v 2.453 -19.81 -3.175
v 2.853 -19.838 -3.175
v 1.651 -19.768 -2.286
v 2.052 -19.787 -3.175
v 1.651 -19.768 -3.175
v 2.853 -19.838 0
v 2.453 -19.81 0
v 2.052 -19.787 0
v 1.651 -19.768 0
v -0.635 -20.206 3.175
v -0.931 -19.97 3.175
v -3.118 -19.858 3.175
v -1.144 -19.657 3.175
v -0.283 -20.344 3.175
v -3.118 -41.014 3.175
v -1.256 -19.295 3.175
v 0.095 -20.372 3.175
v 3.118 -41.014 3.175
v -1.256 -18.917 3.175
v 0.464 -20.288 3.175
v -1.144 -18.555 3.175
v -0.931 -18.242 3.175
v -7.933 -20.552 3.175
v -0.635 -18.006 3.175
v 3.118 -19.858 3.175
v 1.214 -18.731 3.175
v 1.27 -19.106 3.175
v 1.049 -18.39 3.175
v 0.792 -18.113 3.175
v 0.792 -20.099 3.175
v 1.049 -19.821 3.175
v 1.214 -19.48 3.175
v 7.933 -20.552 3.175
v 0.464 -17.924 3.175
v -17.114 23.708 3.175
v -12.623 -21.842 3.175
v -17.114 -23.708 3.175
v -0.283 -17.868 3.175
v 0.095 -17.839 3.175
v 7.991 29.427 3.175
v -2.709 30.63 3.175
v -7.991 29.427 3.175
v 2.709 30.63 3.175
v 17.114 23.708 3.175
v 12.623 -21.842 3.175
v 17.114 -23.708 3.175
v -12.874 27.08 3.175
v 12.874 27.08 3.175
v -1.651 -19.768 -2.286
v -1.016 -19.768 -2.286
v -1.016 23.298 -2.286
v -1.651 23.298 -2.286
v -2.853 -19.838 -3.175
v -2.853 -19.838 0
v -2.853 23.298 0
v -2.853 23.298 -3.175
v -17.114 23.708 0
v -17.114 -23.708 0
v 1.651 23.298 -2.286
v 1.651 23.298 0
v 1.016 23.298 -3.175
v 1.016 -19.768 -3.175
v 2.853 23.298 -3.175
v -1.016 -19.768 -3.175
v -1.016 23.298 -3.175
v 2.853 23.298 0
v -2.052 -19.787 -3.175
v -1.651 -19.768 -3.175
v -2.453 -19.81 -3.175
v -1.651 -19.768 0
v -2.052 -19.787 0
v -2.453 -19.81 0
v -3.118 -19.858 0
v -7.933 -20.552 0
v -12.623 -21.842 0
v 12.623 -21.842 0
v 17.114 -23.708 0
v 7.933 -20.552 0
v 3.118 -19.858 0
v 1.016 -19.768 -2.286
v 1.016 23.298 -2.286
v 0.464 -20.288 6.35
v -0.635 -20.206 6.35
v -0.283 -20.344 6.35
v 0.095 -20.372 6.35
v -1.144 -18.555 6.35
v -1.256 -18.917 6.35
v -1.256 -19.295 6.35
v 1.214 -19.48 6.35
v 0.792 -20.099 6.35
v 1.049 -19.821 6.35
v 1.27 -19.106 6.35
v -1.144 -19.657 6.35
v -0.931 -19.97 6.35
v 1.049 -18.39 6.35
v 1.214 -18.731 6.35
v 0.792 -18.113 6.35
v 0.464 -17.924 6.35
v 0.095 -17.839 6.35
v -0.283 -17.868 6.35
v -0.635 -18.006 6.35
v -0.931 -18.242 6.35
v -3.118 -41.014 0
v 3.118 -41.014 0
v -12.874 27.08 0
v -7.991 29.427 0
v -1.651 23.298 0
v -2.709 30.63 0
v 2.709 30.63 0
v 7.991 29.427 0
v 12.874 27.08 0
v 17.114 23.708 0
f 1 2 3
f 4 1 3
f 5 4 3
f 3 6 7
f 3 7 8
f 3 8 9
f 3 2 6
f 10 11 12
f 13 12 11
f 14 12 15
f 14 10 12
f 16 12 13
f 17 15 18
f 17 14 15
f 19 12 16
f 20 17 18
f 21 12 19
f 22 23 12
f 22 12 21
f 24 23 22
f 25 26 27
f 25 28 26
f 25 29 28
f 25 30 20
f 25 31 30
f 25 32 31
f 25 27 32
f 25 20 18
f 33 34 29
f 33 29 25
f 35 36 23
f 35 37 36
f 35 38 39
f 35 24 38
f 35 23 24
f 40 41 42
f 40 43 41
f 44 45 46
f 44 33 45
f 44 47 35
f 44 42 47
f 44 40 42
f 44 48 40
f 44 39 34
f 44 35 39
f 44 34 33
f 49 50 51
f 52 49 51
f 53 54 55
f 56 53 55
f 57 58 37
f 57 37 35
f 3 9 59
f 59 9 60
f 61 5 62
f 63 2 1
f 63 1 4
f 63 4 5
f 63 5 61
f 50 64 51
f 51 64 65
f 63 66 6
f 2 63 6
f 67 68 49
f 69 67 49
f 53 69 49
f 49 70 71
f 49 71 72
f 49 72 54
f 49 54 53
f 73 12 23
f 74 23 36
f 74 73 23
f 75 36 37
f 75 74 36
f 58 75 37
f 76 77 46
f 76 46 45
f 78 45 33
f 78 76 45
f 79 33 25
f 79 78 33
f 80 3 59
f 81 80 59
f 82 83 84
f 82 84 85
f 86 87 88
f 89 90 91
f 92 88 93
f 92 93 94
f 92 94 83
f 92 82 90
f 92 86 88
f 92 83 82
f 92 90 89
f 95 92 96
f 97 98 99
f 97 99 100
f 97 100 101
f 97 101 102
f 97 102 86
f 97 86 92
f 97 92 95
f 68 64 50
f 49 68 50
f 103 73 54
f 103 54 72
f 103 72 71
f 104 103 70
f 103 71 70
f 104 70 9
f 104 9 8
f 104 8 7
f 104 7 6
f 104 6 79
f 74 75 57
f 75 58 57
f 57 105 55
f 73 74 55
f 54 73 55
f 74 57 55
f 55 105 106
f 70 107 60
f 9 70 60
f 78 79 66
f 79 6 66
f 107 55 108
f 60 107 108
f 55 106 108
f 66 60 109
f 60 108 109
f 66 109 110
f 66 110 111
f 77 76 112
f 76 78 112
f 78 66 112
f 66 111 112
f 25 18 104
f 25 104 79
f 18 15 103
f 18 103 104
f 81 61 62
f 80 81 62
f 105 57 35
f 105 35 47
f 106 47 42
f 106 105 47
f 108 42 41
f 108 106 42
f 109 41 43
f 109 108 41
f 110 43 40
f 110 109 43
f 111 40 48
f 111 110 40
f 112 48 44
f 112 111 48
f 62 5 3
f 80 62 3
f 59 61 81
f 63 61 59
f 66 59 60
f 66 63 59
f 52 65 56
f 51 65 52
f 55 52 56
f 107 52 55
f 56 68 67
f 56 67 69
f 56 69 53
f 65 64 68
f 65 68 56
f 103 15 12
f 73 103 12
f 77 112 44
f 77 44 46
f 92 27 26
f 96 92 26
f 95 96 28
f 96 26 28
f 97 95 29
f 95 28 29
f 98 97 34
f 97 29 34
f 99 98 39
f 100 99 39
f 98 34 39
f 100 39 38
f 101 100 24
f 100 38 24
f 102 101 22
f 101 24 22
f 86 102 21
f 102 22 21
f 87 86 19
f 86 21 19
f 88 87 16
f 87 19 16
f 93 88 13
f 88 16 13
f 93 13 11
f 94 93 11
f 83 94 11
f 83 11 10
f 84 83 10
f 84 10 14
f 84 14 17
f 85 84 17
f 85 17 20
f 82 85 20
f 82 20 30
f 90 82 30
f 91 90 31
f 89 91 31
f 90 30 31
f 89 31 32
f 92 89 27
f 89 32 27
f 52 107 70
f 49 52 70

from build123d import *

# Parameters (mm, degrees)
BOSS_EXTRUDE1_DEPTH = 3.175
BOSS_EXTRUDE2_DEPTH = 3.175
SKETCH3_W           = 6.236959702
SKETCH3_H           = 41.352711554
BOSS_EXTRUDE3_DEPTH = 3.175
SKETCH4_R           = 1.27
BOSS_EXTRUDE4_DEPTH = 3.175
BOSS_EXTRUDE5_REACH = 20.766
SKETCH6_W           = 0.889
SKETCH6_H           = 43.066281197
CUT_EXTRUDE1_REACH  = 11.525


with BuildPart() as part:
    # Sketch1 → Boss-Extrude1 (new body)
    with BuildSketch(Plane.XY):
        with BuildLine():
            Line((-17.114253333, -23.707583903), (-17.114253333, 23.707583903))
            ThreePointArc((-17.114253333, 23.707583903), (0, 30.782200079), (17.114253333, 23.707583903))
            Line((17.114253333, 23.707583903), (17.114253333, -23.707583903))
            ThreePointArc((17.114253333, -23.707583903), (0, -19.732802645), (-17.114253333, -23.707583903))
        make_face()
    extrude(amount=BOSS_EXTRUDE1_DEPTH)

    # Sketch2 → Boss-Extrude2 (add)
    with BuildSketch(Plane(origin=(0, 0, 0), x_dir=(-1, 0, 0), z_dir=(0, 0, -1))):
        with BuildLine():
            Line((-1.65128862, -19.767928257), (-1.65128862, 22.268343179))
            Line((-1.65128862, 22.268343179), (-1.65128862, 23.29835294))
            Line((-1.65128862, 23.29835294), (-2.853426735, 23.29835294))
            Line((-2.853426735, 23.29835294), (-2.853426735, -19.837781624))
            ThreePointArc((-2.853426735, -19.837781624), (-2.25262846, -19.798194915), (-1.65128862, -19.767928257))
        make_face()
        with BuildLine():
            Line((1.65128862, 23.29835294), (1.65128862, 22.268343179))
            Line((1.65128862, 22.268343179), (1.65128862, -19.767928257))
            ThreePointArc((1.65128862, -19.767928257), (2.25262846, -19.798194915), (2.853426735, -19.837781624))
            Line((2.853426735, -19.837781624), (2.853426735, 23.29835294))
            Line((2.853426735, 23.29835294), (1.65128862, 23.29835294))
        make_face()
    extrude(amount=BOSS_EXTRUDE2_DEPTH)

    # Sketch3 → Boss-Extrude3 (add)
    with BuildSketch(Plane.XY.offset(3.175)):
        with Locations((0, -20.33746726)):
            Rectangle(SKETCH3_W, SKETCH3_H)
    extrude(amount=-BOSS_EXTRUDE3_DEPTH)

    # Sketch4 → Boss-Extrude4 (add)
    with BuildSketch(Plane.XY.offset(3.175)):
        with Locations((0, -19.105823038)):
            Circle(SKETCH4_R)
    extrude(amount=BOSS_EXTRUDE4_DEPTH)

    # Sketch6 → Boss-Extrude5 (add, up to next)
    with BuildSketch(Plane.ZY.offset(-1.65128862), mode=Mode.PRIVATE) as boss_extrude5_sk1:
        with Locations((-2.7305, 1.765212341)):
            Rectangle(SKETCH6_W, SKETCH6_H)
    boss_extrude5_tool1 = extrude(boss_extrude5_sk1.sketch, amount=BOSS_EXTRUDE5_REACH, mode=Mode.PRIVATE) - part.part
    add(boss_extrude5_tool1.solids().sort_by_distance((1.651289, 1.765212, -2.7305))[0])

    # Sketch8 → Cut-Extrude1 (cut, up to next)
    with BuildSketch(Plane(origin=(0, 0, -3.175), x_dir=(-1, 0, 0), z_dir=(0, 0, -1)), mode=Mode.PRIVATE) as cut_extrude1_sk1:
        Polygon((0, 23.29835294), (-1.016, 23.29835294), (-1.016, -19.767928257), (1.016, -19.767928257), (1.016, 23.29835294), align=None)
    cut_extrude1_tool1 = extrude(cut_extrude1_sk1.sketch, amount=-CUT_EXTRUDE1_REACH, mode=Mode.PRIVATE) & part.part
    add(cut_extrude1_tool1.solids().sort_by_distance((0, 1.765212, -3.175))[0], mode=Mode.SUBTRACT)


solid = part.part
